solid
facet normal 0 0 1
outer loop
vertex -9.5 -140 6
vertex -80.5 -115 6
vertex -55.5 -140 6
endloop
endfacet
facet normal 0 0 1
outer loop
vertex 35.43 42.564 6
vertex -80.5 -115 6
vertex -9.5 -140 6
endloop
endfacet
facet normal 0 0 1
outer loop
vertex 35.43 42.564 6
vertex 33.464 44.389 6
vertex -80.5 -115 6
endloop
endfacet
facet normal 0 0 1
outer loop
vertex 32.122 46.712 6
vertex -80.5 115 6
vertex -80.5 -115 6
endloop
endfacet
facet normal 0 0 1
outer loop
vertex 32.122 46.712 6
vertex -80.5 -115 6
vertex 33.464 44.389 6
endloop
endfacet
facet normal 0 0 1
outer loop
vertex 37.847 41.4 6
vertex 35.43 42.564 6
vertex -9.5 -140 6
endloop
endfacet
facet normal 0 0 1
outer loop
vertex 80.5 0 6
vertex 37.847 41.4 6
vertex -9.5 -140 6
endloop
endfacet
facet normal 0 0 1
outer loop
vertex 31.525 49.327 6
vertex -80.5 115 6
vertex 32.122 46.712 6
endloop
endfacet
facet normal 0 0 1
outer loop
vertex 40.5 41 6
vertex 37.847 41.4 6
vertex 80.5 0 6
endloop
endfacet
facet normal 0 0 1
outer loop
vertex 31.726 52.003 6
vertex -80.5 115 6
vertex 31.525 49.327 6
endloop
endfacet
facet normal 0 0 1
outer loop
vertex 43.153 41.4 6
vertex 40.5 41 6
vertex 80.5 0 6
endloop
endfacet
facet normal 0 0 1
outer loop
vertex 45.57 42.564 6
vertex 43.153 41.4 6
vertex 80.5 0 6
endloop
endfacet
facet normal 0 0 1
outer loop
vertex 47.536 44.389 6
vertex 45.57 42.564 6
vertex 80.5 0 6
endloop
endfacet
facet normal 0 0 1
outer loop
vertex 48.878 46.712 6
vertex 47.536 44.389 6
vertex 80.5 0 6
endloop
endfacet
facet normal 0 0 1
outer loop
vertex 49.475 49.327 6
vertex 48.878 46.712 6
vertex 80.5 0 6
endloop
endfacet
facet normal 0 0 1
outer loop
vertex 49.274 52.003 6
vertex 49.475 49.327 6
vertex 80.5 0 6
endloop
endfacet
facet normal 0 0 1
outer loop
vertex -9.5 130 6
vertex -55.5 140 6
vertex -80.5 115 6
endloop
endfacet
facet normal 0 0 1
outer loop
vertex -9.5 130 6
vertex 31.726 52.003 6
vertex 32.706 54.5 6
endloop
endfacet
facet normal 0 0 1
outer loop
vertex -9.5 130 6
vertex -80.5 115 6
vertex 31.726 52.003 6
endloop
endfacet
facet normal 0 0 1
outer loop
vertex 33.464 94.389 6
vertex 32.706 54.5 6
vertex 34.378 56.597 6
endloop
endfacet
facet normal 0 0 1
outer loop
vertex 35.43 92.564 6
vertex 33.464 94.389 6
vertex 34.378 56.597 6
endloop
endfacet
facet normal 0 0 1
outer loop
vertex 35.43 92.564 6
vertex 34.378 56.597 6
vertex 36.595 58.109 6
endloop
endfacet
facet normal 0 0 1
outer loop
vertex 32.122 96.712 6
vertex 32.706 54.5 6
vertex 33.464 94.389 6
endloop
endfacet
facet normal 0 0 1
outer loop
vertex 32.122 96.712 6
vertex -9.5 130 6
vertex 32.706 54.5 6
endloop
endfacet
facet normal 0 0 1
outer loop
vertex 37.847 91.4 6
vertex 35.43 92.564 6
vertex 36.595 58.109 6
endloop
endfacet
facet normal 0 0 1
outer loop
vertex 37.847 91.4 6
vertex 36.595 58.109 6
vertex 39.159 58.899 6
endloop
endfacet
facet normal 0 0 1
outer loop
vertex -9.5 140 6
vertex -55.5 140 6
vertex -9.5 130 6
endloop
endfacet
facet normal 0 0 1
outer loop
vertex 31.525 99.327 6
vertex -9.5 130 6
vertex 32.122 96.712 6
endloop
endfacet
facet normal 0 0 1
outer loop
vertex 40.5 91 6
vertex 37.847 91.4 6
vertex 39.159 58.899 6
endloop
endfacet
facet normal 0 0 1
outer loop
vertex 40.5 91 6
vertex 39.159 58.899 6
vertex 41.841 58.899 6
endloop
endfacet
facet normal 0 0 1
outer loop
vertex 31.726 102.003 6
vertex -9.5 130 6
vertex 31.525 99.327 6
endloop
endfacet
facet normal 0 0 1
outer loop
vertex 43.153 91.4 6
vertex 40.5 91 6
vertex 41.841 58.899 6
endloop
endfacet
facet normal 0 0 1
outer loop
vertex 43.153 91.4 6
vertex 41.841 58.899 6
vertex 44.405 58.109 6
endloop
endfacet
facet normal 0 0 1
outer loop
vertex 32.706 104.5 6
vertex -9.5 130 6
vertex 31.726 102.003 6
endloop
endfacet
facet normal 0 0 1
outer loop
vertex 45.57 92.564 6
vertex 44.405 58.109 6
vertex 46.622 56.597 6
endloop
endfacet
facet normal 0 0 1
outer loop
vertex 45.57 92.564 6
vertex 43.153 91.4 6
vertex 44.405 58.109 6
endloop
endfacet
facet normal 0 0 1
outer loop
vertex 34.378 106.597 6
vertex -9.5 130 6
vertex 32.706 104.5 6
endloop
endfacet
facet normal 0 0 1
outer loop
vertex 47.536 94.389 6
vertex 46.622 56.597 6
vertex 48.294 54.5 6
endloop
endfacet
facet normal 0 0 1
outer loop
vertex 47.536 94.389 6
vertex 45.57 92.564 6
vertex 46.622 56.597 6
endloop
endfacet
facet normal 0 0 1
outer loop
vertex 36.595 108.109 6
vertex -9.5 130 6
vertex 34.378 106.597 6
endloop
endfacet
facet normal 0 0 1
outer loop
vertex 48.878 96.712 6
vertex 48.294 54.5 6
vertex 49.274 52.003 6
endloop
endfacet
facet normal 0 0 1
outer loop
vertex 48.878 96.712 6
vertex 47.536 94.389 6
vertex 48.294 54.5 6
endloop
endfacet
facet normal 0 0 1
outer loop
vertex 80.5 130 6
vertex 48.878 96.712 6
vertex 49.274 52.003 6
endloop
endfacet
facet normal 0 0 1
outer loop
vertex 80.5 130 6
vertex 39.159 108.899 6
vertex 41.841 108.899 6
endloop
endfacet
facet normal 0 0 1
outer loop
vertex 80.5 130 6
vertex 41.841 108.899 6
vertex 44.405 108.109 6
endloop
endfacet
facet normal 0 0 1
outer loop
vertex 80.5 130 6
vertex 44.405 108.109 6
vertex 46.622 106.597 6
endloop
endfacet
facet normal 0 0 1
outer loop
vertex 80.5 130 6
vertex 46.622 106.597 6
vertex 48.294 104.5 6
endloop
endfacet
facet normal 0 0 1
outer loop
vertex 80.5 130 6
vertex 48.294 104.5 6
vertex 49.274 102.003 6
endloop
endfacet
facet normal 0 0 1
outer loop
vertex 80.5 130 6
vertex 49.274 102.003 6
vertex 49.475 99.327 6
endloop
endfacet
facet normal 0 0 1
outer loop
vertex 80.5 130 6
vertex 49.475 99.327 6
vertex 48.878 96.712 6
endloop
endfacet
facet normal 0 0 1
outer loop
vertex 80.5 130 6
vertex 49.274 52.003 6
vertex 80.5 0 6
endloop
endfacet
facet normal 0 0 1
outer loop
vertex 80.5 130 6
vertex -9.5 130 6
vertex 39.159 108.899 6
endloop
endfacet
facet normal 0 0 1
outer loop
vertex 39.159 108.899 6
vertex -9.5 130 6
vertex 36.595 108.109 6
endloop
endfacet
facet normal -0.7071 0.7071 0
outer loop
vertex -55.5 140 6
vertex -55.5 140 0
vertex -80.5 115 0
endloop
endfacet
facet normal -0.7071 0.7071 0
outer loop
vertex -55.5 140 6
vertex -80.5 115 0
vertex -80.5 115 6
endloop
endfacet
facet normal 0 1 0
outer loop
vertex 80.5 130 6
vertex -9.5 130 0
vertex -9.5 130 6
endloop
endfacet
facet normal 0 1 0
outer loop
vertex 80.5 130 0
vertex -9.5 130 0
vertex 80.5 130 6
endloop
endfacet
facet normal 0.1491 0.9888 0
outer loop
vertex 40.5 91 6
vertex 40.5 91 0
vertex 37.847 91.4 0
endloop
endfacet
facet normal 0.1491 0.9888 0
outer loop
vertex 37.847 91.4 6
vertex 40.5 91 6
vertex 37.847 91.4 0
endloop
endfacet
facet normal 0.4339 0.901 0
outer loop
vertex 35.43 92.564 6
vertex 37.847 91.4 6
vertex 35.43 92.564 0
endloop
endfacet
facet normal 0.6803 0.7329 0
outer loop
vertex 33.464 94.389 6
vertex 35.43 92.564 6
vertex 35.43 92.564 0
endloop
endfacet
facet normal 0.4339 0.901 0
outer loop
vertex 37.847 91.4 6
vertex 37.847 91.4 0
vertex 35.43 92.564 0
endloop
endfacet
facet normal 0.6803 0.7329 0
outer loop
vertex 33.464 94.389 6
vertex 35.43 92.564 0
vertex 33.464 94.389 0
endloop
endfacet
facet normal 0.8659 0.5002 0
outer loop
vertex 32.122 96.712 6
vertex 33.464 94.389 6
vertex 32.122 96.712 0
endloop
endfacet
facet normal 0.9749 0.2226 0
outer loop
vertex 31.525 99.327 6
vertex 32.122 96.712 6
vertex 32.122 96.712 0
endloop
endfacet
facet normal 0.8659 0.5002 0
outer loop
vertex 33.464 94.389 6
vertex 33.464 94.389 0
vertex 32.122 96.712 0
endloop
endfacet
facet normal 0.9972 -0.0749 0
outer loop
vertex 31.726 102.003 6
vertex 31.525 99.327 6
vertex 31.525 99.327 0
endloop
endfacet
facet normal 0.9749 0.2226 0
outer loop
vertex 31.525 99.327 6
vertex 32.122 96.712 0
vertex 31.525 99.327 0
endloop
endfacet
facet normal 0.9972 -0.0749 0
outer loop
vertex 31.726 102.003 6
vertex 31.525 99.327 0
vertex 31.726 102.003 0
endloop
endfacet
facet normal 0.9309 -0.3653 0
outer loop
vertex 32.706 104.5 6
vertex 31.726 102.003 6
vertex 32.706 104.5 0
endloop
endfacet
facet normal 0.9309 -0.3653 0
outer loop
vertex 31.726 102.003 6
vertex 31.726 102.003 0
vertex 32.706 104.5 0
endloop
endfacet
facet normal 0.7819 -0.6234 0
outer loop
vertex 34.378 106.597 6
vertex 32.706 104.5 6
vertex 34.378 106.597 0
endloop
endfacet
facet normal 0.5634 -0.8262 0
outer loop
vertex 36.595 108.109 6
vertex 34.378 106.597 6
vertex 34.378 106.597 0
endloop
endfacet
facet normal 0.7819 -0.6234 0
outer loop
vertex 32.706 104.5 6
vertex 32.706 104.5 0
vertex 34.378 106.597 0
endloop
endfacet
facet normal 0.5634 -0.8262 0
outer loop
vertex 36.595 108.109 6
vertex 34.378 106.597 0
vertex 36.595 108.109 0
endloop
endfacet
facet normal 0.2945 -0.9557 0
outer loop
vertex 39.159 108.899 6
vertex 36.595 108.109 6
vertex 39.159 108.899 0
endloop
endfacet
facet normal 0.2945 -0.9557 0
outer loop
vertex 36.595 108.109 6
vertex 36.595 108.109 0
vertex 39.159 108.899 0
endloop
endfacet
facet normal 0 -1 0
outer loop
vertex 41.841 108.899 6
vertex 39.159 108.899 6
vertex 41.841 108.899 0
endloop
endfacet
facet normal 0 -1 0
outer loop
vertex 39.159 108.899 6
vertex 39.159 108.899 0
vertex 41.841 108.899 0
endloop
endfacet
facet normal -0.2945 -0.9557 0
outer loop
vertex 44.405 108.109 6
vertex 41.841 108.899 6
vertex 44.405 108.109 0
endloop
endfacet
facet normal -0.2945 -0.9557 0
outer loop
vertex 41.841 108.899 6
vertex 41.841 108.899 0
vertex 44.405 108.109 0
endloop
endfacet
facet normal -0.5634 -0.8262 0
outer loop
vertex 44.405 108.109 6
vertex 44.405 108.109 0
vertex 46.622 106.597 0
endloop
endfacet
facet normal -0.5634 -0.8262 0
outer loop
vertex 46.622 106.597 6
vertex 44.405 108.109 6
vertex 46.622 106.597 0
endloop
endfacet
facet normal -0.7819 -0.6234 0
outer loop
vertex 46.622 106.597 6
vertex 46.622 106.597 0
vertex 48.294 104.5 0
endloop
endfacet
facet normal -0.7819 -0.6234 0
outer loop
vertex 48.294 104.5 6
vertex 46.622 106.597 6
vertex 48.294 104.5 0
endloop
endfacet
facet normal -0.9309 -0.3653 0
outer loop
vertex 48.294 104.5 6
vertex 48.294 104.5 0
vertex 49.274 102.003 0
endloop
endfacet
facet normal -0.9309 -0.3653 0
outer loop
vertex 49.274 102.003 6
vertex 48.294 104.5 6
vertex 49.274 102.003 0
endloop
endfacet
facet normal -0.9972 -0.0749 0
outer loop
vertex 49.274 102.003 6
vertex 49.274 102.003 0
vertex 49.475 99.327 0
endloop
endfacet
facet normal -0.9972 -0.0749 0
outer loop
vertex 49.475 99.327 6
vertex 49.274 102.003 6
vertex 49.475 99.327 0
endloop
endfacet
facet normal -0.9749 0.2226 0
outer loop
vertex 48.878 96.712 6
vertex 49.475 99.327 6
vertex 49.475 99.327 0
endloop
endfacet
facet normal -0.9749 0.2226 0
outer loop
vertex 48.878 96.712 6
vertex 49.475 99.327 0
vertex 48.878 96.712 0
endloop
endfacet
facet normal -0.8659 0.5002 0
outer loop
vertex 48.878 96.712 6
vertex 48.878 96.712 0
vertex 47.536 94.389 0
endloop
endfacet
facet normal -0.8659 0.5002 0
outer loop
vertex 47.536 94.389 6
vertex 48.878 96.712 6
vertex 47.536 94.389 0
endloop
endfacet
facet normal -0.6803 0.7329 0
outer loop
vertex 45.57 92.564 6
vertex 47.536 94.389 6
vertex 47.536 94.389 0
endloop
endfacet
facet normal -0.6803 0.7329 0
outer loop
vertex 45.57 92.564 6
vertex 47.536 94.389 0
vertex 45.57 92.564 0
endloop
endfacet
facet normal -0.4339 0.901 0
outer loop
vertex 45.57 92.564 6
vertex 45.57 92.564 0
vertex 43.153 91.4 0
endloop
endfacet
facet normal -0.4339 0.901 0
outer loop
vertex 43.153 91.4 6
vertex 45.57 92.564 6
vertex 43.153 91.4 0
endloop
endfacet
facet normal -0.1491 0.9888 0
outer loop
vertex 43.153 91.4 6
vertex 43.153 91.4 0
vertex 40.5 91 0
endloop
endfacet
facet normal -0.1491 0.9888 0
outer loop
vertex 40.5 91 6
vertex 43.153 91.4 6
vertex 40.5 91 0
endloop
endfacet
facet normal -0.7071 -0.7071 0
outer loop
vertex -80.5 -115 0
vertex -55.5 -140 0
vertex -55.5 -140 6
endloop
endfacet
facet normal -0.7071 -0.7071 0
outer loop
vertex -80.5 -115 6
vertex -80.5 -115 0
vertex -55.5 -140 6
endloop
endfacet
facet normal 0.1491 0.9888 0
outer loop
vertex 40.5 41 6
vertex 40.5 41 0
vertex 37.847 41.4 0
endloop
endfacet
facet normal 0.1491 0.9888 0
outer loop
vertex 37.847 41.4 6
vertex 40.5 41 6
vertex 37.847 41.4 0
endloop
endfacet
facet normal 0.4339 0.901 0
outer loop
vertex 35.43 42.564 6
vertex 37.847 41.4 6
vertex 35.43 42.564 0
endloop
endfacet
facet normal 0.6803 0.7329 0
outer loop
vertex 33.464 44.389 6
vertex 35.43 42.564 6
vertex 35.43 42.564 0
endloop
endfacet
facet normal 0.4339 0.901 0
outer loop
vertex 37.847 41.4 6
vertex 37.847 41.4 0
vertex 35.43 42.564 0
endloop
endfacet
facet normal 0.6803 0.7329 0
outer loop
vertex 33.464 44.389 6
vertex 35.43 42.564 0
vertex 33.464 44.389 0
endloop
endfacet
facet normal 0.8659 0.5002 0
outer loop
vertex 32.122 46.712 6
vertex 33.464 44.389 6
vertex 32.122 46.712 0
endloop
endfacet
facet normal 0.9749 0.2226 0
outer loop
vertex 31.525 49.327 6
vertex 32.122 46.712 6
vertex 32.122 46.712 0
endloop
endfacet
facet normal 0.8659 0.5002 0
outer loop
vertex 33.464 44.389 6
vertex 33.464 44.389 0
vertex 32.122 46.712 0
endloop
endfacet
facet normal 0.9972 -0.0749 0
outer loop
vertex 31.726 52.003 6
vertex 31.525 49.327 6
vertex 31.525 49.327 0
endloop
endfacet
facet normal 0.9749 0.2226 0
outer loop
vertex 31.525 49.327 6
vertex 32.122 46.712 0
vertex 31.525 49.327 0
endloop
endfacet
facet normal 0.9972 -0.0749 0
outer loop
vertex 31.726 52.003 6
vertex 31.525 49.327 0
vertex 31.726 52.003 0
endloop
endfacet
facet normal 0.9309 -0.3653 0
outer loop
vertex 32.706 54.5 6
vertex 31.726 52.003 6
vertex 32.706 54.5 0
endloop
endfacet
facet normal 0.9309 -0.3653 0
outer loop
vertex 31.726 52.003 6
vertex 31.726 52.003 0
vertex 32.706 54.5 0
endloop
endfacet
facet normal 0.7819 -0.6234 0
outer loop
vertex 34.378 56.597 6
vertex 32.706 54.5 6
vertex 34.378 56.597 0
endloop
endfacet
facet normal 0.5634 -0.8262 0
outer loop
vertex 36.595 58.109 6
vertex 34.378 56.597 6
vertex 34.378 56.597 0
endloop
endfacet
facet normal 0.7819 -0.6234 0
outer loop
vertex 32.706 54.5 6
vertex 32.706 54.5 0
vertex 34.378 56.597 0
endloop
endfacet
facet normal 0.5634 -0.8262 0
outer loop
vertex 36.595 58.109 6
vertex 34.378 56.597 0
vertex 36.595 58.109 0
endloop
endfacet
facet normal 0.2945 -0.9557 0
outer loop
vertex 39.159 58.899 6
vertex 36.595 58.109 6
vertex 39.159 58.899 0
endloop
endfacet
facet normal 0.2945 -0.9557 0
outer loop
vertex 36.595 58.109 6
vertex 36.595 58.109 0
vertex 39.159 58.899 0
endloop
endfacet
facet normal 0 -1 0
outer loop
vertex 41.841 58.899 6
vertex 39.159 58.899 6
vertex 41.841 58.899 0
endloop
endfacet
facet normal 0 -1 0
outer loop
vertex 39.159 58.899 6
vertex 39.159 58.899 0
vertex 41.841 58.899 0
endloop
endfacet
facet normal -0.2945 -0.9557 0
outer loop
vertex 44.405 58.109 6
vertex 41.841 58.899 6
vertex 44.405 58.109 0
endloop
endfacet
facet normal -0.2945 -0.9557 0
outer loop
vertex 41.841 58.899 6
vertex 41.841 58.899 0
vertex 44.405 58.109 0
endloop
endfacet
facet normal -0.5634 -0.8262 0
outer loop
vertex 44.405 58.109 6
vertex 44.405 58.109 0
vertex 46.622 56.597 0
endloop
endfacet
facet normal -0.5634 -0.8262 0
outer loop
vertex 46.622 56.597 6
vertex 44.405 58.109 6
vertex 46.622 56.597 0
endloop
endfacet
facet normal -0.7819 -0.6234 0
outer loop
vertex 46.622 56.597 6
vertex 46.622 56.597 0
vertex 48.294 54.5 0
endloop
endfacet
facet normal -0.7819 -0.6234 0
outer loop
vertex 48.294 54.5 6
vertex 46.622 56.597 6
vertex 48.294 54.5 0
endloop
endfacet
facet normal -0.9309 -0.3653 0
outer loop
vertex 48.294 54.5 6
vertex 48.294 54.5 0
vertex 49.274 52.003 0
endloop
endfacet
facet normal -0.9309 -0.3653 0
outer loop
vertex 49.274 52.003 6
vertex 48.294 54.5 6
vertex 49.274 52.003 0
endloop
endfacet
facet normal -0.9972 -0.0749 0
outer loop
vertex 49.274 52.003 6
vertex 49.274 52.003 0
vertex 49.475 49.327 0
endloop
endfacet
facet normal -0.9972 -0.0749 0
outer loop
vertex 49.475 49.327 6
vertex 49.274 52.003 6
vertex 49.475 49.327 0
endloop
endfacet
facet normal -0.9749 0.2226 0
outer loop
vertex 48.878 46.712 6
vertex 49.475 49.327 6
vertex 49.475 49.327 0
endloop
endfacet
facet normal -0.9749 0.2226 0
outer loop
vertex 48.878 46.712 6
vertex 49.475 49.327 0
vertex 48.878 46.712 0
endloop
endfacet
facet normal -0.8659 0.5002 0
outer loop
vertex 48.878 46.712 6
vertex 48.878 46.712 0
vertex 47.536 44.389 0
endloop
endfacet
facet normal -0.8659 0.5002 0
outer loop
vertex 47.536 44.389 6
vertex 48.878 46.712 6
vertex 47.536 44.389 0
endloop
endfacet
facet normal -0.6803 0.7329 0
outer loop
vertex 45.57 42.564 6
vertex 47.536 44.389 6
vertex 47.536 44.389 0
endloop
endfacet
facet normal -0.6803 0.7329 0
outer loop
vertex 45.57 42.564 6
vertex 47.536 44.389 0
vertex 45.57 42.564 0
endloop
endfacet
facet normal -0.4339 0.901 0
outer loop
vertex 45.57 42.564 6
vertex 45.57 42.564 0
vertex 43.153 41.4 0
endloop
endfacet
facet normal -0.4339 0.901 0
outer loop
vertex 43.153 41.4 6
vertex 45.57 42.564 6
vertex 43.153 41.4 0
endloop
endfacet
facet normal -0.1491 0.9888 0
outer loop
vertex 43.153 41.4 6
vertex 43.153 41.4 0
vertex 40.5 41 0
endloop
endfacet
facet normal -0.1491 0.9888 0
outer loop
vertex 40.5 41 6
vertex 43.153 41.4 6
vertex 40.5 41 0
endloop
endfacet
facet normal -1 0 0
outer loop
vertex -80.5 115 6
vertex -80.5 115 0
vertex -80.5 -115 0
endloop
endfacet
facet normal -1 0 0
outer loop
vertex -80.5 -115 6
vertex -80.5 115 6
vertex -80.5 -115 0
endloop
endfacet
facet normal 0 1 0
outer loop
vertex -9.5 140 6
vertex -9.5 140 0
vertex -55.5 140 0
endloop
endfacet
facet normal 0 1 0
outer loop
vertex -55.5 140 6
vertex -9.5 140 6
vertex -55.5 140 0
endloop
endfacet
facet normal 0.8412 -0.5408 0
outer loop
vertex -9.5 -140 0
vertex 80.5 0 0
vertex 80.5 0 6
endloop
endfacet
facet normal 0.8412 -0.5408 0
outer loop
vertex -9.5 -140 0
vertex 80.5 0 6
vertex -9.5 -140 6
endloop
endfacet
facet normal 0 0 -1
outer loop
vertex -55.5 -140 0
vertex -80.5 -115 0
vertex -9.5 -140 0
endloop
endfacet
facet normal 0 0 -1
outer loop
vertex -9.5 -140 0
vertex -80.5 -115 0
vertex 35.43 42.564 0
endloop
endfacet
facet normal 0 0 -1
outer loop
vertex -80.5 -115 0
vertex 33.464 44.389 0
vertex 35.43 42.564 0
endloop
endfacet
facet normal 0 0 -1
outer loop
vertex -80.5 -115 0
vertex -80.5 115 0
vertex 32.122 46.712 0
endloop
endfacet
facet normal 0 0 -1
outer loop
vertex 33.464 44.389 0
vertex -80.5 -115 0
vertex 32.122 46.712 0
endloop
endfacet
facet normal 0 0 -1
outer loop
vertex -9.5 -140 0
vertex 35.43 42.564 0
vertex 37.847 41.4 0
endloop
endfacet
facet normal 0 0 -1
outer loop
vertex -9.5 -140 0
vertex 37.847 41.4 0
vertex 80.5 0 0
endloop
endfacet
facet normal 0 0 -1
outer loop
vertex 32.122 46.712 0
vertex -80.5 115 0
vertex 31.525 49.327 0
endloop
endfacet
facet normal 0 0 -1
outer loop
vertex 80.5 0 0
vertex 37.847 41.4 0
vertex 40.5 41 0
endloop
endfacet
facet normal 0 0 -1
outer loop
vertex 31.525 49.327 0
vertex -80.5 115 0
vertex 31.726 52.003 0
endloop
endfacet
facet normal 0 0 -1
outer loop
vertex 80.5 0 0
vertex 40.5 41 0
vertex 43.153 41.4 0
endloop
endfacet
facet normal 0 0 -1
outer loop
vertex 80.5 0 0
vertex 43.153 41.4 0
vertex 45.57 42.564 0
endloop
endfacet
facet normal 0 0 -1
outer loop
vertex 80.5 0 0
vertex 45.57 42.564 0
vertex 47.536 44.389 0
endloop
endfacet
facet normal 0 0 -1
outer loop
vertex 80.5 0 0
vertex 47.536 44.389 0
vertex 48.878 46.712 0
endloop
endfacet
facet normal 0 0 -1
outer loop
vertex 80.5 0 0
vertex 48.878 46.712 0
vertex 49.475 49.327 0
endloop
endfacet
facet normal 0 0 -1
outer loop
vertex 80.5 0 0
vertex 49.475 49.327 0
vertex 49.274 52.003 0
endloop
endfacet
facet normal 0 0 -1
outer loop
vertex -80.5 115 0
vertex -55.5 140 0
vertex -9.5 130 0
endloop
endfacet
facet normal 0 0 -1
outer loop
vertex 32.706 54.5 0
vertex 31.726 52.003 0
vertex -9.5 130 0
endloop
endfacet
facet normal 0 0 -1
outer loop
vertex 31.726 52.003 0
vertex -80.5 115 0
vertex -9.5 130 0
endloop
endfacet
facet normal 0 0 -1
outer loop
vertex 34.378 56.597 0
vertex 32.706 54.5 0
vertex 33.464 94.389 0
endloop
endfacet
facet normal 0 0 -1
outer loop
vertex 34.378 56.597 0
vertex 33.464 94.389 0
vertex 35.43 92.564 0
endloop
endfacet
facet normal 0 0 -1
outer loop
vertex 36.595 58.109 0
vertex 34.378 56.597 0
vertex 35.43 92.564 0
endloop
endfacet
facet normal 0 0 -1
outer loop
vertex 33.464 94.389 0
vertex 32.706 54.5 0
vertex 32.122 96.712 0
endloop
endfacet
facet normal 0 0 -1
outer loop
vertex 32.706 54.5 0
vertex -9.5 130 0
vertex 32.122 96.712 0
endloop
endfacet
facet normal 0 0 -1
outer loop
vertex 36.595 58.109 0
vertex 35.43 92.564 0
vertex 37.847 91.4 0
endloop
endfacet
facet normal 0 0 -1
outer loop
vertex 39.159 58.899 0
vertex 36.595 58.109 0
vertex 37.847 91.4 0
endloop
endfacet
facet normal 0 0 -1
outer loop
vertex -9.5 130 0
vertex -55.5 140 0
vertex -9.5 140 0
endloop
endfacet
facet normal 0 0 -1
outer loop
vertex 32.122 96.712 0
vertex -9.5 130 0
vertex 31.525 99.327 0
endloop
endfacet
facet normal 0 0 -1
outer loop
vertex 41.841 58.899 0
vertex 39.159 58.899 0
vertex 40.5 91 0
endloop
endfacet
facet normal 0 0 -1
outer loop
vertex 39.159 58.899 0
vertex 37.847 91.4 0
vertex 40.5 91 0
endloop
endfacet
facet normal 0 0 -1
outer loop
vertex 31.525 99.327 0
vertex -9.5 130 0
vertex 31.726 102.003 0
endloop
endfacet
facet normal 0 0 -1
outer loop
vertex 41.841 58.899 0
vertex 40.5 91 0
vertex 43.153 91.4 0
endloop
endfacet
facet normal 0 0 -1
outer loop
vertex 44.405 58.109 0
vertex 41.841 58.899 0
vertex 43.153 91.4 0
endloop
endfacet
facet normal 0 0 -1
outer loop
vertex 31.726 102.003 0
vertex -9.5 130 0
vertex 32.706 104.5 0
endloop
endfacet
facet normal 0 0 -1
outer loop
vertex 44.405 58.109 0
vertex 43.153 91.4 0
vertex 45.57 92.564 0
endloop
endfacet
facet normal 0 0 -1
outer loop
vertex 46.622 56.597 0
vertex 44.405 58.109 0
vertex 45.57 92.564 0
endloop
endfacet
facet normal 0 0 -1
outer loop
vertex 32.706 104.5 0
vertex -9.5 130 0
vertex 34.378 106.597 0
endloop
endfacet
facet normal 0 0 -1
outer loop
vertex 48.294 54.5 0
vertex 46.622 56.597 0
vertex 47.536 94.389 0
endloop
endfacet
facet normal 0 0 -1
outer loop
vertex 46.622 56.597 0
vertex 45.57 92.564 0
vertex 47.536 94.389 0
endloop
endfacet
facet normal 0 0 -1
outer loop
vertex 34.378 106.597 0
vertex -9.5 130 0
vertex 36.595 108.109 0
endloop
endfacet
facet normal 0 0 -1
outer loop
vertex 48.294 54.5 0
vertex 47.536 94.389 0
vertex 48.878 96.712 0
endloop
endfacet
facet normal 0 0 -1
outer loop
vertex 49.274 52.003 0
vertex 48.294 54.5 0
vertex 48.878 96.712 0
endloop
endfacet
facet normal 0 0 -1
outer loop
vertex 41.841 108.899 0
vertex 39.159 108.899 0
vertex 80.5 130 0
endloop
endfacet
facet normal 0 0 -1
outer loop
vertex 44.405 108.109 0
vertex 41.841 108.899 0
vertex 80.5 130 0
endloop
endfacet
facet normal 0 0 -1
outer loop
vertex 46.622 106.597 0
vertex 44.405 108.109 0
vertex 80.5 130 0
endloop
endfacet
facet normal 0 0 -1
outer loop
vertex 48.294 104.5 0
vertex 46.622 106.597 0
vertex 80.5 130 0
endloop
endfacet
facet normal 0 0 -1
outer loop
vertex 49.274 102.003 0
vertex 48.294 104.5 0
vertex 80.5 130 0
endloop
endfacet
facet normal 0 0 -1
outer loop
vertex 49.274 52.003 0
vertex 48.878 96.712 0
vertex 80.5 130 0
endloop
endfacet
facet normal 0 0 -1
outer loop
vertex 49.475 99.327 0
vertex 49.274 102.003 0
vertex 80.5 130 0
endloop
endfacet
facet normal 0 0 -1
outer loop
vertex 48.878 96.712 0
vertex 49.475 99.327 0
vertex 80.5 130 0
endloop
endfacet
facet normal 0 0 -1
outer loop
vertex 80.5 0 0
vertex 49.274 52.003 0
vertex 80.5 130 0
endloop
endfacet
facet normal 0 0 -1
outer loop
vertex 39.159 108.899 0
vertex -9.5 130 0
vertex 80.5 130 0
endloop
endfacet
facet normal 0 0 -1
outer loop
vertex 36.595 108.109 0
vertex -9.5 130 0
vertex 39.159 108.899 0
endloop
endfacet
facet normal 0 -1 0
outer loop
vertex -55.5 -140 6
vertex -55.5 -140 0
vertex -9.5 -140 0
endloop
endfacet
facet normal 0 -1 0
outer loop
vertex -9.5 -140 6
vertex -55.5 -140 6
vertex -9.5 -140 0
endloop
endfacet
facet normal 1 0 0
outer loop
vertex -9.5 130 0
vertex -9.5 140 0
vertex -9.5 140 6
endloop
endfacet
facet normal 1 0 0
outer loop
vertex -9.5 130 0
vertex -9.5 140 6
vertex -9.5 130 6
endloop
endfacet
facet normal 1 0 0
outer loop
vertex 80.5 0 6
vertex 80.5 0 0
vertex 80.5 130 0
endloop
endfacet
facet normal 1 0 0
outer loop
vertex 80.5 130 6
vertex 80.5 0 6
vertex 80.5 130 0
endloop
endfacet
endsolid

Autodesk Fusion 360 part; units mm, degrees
sketch "スケッチ1" plane through (0, 0, 0) normal (0, 0, 1) x (1, 0, 0)
  line L0 (-9.5, 140) -> (-80.5, 140)
  line L1 (-80.5, 140) -> (-80.5, -140)
  line L2 (-80.5, -140) -> (-9.5, -140)
  line L3 (80.5, 0) -> (80.5, 130)
  line L4 (74.75, 130) -> (-80.5, -140) construction
  line L5 (-80.5, 140) -> (38.0073, -66.0997) construction
  line L6 (-9.5, 140) -> (-9.5, 130)
  line L7 (-9.5, 130) -> (80.5, 130)
  line L8 (-80.5, -140) -> (-9.5, -140) construction
  line L9 (80.5, 0) -> (-9.5, -140)
  dimension "d2" = 280
  dimension "d5" = 71
extrude "押し出し1" add sketch "スケッチ1" along normal blind 6
chamfer "面取り1" distance 25 angle 45 2 edges at (-80.5, -140, 3) (-80.5, 140, 3)
sketch "スケッチ2" plane through (0, 0, 6) normal (0, 0, 1) x (-1, 0, 0)
  line L0 (55.5, -140) -> (80.5, -115)
  line L1 (80.5, -115) -> (80.5, 115)
  line L2 (80.5, 115) -> (55.5, 140)
  line L3 (55.5, 140) -> (9.5, 140)
  line L4 (9.5, 140) -> (-80.5, 0)
  line L5 (-80.5, 0) -> (-80.5, -130)
  line L6 (-80.5, -130) -> (9.5, -130)
  line L7 (9.5, -130) -> (9.5, -140)
  line L8 (9.5, -140) -> (55.5, -140)
  line L9 (-80.5, -130) -> (-40.5, -130) construction
  line L10 (-40.5, -130) -> (-40.5, -100) construction
  line L11 (-40.5, -100) -> (-80.5, -100) construction
  line L12 (-80.5, -100) -> (-80.5, -130) construction
  line L13 (-40.5, -100) -> (-40.5, -50) construction
  point P0 (-40.5, -100)
  point P1 (-40.5, -50)
  dimension "d10" = 40
  dimension "d11" = 30
  dimension "d12" = 50
hole "穴1" at (40.5, 100, 6) at (40.5, 50, 6) direction (0, 0, -1) diameter 18 end through all
equation "d5 = 25 mm + 46 mm"
